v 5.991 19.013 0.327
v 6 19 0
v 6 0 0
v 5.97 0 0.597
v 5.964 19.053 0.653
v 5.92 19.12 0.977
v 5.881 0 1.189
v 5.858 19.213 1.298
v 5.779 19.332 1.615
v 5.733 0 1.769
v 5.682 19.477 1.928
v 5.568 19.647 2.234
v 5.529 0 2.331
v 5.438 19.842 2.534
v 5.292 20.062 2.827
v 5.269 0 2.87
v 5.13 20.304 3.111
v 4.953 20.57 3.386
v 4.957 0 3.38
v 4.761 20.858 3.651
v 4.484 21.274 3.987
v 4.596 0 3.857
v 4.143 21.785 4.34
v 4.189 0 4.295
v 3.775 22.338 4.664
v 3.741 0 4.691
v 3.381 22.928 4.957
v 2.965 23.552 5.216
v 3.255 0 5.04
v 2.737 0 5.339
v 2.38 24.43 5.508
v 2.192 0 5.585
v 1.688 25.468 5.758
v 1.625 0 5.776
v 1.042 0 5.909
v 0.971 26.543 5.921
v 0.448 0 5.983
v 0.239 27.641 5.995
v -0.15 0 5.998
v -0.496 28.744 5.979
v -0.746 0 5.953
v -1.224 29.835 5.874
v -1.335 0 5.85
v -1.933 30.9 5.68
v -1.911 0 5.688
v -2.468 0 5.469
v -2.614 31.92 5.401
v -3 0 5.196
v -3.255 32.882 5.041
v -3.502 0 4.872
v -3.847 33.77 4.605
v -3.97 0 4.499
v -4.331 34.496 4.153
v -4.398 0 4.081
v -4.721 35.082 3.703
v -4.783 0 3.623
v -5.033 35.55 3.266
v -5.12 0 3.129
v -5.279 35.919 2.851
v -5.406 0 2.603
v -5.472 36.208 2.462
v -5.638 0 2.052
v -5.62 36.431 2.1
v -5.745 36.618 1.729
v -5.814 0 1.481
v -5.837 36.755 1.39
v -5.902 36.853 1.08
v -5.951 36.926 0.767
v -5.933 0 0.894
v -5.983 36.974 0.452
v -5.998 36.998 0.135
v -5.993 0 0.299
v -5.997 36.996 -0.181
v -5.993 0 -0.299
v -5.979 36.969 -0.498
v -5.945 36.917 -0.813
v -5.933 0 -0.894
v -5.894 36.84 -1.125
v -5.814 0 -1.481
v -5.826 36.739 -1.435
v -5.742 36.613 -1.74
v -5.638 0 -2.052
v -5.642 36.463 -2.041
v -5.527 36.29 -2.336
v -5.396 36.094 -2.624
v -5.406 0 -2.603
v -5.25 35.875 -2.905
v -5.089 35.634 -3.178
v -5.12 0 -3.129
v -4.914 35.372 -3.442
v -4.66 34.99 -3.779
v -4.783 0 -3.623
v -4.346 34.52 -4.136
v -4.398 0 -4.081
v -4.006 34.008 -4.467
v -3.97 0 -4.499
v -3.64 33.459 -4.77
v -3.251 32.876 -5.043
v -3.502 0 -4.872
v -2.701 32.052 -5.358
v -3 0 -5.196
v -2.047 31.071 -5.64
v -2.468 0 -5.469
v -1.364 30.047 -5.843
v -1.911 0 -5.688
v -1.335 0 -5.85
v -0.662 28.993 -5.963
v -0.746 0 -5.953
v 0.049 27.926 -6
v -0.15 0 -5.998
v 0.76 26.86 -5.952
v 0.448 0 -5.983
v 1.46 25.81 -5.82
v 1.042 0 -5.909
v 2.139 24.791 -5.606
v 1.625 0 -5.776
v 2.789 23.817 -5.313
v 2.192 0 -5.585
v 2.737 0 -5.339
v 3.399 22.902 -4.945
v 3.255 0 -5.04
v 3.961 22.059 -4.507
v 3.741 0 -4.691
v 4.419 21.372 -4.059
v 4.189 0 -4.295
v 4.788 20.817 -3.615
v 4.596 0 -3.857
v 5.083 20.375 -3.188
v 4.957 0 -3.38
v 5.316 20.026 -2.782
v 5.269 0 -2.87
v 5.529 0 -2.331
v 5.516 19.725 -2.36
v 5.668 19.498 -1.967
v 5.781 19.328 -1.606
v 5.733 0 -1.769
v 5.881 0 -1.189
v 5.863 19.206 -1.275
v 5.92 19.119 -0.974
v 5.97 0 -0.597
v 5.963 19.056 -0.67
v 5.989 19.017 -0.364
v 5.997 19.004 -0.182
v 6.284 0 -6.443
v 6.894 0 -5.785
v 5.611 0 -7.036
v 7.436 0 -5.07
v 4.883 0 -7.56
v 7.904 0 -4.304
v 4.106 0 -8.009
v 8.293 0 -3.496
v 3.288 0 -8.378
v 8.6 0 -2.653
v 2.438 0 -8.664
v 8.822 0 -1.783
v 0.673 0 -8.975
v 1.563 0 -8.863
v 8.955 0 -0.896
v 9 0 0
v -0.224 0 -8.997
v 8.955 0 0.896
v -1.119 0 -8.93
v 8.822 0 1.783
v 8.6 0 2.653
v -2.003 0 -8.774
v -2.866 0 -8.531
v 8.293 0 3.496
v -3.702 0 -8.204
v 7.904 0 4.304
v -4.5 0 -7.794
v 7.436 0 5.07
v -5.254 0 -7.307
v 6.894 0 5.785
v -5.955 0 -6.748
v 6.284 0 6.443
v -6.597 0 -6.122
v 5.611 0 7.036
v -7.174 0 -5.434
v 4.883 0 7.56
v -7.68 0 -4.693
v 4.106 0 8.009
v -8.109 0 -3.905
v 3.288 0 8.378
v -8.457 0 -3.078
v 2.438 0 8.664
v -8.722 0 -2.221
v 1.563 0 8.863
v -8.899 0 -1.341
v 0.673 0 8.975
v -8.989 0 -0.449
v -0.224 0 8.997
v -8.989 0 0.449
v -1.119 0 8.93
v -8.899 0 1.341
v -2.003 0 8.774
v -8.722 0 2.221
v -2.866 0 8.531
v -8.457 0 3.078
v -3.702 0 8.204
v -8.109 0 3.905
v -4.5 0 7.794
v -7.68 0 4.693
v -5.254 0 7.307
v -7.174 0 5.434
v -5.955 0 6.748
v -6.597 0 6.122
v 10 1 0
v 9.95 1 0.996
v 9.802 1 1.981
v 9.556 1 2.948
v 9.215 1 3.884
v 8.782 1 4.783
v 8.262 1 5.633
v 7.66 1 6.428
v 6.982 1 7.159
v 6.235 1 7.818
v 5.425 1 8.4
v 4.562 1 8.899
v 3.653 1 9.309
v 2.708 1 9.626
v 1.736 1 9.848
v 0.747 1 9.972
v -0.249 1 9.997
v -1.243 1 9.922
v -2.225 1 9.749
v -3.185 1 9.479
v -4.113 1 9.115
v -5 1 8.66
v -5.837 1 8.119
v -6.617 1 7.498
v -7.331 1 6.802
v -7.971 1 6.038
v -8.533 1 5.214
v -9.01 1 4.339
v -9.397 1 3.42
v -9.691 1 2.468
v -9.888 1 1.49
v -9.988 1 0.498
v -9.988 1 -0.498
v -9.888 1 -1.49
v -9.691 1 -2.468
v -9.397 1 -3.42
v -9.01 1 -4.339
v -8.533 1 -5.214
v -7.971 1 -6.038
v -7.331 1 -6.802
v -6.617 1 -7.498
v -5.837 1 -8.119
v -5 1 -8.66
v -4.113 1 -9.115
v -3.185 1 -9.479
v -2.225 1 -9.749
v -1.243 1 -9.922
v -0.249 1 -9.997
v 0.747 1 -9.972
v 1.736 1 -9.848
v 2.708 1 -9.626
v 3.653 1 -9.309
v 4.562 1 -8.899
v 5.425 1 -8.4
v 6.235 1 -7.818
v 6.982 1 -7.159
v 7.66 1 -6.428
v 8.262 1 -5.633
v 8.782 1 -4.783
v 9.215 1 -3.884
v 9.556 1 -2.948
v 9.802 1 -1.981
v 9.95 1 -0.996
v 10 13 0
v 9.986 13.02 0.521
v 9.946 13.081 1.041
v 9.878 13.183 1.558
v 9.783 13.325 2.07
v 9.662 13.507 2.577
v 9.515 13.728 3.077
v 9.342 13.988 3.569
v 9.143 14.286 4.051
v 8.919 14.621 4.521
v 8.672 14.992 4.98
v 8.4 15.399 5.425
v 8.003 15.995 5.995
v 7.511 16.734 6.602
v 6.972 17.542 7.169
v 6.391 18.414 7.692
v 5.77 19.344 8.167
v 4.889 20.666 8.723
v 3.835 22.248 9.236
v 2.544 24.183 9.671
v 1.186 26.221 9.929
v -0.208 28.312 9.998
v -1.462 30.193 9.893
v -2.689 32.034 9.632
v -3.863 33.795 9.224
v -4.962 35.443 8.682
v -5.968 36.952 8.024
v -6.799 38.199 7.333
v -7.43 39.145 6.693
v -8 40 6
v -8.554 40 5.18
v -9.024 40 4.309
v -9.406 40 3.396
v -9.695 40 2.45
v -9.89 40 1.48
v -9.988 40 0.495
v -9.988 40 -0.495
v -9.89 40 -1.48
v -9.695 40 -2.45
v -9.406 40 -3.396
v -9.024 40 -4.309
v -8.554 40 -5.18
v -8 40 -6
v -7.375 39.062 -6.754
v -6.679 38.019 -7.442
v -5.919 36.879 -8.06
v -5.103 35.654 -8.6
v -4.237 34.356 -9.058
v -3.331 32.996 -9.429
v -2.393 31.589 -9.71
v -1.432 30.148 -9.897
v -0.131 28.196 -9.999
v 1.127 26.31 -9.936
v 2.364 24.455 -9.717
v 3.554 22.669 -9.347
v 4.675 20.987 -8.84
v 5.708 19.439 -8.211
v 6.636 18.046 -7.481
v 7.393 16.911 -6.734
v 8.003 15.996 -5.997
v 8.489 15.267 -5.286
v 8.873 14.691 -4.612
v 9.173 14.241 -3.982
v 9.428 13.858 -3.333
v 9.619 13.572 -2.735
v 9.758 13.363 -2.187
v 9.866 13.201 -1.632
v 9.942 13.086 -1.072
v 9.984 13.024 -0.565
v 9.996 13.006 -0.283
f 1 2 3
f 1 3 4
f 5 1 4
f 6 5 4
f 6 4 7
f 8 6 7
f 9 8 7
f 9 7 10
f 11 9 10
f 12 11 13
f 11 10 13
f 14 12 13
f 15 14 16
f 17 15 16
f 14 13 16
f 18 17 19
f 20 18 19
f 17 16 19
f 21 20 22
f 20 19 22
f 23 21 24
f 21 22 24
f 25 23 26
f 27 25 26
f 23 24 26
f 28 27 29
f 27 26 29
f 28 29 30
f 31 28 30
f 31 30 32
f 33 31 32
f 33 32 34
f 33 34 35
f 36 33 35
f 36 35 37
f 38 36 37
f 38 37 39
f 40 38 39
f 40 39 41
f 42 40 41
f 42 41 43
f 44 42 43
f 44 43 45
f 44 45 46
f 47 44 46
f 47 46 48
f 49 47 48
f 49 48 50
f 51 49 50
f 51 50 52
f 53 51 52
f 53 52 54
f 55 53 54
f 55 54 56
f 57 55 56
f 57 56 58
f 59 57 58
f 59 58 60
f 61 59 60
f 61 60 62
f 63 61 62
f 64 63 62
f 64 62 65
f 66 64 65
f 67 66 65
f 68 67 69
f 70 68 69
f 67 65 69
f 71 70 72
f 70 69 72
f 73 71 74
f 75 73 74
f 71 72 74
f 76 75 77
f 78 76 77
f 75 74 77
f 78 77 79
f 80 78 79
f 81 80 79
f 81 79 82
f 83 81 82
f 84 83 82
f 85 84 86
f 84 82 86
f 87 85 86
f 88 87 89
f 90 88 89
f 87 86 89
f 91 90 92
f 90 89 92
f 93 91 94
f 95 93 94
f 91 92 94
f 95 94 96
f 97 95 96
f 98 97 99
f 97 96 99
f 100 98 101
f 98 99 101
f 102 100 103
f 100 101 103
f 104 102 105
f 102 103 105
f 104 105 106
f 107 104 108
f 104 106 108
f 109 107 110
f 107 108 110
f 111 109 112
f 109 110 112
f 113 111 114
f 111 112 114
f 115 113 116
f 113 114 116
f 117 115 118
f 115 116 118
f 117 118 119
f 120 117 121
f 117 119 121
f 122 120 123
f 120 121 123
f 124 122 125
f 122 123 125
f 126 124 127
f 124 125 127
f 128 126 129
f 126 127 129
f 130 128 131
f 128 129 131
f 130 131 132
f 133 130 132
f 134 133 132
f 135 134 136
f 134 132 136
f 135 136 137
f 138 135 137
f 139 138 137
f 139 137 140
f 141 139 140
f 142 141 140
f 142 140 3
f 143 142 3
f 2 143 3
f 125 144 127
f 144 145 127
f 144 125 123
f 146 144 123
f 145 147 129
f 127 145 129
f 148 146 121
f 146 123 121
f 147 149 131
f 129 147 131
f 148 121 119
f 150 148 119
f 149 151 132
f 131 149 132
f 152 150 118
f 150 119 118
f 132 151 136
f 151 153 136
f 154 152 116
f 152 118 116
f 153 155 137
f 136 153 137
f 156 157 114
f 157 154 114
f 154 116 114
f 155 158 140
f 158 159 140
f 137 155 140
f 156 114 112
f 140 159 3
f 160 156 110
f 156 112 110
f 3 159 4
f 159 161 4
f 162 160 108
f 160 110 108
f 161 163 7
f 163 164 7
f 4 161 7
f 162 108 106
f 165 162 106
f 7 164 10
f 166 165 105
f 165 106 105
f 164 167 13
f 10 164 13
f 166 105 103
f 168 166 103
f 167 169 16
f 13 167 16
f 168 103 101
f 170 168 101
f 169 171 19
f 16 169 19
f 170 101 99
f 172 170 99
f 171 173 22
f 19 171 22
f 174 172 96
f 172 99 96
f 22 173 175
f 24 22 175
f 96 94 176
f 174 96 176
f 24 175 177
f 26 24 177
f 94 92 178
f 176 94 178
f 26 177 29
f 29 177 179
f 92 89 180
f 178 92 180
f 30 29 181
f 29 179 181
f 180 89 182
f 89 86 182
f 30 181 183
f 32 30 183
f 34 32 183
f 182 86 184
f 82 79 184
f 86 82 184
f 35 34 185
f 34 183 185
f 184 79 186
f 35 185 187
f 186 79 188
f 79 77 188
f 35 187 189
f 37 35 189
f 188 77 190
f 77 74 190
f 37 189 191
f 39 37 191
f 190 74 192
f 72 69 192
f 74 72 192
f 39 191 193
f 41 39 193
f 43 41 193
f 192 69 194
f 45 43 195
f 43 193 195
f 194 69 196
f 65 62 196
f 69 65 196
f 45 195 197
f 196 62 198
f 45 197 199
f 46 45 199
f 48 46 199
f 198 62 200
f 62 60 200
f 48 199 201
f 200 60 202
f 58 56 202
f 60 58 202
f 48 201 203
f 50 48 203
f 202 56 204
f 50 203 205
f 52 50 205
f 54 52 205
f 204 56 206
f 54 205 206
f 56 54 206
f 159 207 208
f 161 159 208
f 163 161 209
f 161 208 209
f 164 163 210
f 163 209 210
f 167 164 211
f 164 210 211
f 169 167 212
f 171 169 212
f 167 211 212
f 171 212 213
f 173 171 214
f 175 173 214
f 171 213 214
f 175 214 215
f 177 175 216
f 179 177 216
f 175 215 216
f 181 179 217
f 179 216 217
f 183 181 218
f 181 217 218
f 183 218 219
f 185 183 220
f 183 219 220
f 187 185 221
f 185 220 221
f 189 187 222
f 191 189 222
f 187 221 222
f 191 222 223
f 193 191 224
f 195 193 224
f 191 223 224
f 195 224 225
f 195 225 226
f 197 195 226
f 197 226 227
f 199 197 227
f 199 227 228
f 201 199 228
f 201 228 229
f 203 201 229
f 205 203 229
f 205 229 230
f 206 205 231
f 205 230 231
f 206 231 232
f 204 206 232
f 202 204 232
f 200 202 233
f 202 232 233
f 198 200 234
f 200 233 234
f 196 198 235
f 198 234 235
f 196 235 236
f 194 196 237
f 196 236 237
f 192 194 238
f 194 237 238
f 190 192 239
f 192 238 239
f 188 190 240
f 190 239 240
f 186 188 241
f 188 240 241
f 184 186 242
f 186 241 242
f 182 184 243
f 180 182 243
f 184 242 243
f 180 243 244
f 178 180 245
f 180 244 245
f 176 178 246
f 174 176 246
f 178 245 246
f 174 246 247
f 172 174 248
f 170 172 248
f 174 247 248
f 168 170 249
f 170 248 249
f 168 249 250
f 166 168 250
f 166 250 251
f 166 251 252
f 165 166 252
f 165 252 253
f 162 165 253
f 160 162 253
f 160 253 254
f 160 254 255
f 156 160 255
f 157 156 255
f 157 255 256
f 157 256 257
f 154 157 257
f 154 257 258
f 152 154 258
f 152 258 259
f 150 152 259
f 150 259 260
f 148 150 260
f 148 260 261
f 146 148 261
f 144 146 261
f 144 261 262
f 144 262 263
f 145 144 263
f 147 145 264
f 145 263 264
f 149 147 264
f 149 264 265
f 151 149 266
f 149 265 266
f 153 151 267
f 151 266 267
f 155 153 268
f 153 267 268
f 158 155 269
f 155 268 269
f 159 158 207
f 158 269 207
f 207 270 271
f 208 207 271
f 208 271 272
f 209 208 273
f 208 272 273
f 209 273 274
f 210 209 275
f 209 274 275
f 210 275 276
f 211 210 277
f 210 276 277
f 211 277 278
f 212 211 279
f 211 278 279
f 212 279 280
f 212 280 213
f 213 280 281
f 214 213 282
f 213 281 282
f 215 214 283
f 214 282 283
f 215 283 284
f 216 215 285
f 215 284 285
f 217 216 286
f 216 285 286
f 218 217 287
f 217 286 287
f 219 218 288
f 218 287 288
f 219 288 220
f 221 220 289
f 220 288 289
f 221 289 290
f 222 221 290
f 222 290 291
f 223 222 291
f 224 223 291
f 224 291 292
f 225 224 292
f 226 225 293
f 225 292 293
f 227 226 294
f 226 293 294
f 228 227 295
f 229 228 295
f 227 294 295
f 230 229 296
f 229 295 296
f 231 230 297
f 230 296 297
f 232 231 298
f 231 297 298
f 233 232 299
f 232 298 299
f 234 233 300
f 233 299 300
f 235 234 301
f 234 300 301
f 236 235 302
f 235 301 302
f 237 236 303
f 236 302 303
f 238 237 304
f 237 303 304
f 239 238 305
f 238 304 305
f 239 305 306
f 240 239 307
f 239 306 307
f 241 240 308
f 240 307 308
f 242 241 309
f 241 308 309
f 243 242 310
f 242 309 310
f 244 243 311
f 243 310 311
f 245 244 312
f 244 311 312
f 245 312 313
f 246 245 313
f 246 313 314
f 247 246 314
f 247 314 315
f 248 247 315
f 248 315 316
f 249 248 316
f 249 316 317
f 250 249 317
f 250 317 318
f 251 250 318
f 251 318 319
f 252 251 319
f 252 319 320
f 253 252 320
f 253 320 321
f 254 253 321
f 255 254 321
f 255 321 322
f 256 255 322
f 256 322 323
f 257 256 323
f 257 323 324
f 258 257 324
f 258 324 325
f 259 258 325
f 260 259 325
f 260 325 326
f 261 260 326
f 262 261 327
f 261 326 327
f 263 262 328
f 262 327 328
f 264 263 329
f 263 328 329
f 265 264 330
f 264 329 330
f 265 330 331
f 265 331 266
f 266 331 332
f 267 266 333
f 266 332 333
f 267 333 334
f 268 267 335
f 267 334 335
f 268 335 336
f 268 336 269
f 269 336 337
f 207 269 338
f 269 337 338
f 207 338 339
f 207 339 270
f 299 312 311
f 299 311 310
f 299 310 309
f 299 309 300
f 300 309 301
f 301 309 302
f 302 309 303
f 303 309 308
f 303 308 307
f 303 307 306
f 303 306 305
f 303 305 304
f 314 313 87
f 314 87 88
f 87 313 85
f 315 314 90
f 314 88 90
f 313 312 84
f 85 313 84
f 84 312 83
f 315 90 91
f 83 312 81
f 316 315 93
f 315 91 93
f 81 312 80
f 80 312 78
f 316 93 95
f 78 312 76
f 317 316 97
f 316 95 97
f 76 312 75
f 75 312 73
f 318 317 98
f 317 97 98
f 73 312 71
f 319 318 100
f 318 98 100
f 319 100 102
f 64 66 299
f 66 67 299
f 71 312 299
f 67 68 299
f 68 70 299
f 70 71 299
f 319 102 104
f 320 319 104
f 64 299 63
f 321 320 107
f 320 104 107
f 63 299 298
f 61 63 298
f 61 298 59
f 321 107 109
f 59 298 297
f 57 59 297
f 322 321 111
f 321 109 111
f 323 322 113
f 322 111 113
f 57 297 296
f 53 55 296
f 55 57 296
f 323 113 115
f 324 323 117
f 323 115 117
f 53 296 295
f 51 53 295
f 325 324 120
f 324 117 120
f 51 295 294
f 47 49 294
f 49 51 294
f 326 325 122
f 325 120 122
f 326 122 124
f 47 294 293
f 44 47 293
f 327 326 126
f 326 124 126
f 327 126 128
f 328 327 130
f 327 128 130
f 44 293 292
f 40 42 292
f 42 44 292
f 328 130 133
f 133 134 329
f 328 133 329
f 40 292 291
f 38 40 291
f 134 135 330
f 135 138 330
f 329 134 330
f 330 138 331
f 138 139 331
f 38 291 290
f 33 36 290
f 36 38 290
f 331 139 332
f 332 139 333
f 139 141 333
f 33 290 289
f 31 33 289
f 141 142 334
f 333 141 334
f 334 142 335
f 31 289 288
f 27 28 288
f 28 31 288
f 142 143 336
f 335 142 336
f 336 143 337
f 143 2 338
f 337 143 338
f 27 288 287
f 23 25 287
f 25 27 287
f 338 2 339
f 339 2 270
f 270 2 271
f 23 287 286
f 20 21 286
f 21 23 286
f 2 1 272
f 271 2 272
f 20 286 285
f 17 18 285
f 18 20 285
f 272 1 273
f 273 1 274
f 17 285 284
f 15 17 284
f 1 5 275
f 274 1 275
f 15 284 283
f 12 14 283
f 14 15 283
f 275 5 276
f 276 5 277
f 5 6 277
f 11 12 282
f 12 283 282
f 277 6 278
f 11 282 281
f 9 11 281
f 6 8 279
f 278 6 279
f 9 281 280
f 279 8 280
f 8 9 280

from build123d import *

# Parameters (mm, degrees)
F0_W     = 10
F0_H     = 40
F3_DEPTH = 25
F4_SIZE  = 1
F5_R     = 6
F6_DEPTH = 50


with BuildPart() as f1:
    # F0 (on Top) → F1 (revolve)
    with BuildSketch(Plane.XY):
        with Locations((5, 20)):
            Rectangle(F0_W, F0_H)
    revolve(axis=Axis((0, 20, 0), (0, -1, 0)))

    # F2 (on Top) → F3 (cut, symmetric)
    with BuildSketch(Plane.XY):
        Polygon((10, 40), (-8, 40), (10, 13), align=None)
    extrude(amount=F3_DEPTH, both=True, mode=Mode.SUBTRACT)

    # F4
    f4_edges = [f1.edges().sort_by_distance(p)[0] for p in [
        (-10, 0, 0),
    ]]
    chamfer(f4_edges, length=F4_SIZE)

    # F5 (on face) → F6 (cut)
    with BuildSketch(Plane.XZ):
        Circle(F5_R)
    extrude(amount=-F6_DEPTH, mode=Mode.SUBTRACT)


solid = f1.part
